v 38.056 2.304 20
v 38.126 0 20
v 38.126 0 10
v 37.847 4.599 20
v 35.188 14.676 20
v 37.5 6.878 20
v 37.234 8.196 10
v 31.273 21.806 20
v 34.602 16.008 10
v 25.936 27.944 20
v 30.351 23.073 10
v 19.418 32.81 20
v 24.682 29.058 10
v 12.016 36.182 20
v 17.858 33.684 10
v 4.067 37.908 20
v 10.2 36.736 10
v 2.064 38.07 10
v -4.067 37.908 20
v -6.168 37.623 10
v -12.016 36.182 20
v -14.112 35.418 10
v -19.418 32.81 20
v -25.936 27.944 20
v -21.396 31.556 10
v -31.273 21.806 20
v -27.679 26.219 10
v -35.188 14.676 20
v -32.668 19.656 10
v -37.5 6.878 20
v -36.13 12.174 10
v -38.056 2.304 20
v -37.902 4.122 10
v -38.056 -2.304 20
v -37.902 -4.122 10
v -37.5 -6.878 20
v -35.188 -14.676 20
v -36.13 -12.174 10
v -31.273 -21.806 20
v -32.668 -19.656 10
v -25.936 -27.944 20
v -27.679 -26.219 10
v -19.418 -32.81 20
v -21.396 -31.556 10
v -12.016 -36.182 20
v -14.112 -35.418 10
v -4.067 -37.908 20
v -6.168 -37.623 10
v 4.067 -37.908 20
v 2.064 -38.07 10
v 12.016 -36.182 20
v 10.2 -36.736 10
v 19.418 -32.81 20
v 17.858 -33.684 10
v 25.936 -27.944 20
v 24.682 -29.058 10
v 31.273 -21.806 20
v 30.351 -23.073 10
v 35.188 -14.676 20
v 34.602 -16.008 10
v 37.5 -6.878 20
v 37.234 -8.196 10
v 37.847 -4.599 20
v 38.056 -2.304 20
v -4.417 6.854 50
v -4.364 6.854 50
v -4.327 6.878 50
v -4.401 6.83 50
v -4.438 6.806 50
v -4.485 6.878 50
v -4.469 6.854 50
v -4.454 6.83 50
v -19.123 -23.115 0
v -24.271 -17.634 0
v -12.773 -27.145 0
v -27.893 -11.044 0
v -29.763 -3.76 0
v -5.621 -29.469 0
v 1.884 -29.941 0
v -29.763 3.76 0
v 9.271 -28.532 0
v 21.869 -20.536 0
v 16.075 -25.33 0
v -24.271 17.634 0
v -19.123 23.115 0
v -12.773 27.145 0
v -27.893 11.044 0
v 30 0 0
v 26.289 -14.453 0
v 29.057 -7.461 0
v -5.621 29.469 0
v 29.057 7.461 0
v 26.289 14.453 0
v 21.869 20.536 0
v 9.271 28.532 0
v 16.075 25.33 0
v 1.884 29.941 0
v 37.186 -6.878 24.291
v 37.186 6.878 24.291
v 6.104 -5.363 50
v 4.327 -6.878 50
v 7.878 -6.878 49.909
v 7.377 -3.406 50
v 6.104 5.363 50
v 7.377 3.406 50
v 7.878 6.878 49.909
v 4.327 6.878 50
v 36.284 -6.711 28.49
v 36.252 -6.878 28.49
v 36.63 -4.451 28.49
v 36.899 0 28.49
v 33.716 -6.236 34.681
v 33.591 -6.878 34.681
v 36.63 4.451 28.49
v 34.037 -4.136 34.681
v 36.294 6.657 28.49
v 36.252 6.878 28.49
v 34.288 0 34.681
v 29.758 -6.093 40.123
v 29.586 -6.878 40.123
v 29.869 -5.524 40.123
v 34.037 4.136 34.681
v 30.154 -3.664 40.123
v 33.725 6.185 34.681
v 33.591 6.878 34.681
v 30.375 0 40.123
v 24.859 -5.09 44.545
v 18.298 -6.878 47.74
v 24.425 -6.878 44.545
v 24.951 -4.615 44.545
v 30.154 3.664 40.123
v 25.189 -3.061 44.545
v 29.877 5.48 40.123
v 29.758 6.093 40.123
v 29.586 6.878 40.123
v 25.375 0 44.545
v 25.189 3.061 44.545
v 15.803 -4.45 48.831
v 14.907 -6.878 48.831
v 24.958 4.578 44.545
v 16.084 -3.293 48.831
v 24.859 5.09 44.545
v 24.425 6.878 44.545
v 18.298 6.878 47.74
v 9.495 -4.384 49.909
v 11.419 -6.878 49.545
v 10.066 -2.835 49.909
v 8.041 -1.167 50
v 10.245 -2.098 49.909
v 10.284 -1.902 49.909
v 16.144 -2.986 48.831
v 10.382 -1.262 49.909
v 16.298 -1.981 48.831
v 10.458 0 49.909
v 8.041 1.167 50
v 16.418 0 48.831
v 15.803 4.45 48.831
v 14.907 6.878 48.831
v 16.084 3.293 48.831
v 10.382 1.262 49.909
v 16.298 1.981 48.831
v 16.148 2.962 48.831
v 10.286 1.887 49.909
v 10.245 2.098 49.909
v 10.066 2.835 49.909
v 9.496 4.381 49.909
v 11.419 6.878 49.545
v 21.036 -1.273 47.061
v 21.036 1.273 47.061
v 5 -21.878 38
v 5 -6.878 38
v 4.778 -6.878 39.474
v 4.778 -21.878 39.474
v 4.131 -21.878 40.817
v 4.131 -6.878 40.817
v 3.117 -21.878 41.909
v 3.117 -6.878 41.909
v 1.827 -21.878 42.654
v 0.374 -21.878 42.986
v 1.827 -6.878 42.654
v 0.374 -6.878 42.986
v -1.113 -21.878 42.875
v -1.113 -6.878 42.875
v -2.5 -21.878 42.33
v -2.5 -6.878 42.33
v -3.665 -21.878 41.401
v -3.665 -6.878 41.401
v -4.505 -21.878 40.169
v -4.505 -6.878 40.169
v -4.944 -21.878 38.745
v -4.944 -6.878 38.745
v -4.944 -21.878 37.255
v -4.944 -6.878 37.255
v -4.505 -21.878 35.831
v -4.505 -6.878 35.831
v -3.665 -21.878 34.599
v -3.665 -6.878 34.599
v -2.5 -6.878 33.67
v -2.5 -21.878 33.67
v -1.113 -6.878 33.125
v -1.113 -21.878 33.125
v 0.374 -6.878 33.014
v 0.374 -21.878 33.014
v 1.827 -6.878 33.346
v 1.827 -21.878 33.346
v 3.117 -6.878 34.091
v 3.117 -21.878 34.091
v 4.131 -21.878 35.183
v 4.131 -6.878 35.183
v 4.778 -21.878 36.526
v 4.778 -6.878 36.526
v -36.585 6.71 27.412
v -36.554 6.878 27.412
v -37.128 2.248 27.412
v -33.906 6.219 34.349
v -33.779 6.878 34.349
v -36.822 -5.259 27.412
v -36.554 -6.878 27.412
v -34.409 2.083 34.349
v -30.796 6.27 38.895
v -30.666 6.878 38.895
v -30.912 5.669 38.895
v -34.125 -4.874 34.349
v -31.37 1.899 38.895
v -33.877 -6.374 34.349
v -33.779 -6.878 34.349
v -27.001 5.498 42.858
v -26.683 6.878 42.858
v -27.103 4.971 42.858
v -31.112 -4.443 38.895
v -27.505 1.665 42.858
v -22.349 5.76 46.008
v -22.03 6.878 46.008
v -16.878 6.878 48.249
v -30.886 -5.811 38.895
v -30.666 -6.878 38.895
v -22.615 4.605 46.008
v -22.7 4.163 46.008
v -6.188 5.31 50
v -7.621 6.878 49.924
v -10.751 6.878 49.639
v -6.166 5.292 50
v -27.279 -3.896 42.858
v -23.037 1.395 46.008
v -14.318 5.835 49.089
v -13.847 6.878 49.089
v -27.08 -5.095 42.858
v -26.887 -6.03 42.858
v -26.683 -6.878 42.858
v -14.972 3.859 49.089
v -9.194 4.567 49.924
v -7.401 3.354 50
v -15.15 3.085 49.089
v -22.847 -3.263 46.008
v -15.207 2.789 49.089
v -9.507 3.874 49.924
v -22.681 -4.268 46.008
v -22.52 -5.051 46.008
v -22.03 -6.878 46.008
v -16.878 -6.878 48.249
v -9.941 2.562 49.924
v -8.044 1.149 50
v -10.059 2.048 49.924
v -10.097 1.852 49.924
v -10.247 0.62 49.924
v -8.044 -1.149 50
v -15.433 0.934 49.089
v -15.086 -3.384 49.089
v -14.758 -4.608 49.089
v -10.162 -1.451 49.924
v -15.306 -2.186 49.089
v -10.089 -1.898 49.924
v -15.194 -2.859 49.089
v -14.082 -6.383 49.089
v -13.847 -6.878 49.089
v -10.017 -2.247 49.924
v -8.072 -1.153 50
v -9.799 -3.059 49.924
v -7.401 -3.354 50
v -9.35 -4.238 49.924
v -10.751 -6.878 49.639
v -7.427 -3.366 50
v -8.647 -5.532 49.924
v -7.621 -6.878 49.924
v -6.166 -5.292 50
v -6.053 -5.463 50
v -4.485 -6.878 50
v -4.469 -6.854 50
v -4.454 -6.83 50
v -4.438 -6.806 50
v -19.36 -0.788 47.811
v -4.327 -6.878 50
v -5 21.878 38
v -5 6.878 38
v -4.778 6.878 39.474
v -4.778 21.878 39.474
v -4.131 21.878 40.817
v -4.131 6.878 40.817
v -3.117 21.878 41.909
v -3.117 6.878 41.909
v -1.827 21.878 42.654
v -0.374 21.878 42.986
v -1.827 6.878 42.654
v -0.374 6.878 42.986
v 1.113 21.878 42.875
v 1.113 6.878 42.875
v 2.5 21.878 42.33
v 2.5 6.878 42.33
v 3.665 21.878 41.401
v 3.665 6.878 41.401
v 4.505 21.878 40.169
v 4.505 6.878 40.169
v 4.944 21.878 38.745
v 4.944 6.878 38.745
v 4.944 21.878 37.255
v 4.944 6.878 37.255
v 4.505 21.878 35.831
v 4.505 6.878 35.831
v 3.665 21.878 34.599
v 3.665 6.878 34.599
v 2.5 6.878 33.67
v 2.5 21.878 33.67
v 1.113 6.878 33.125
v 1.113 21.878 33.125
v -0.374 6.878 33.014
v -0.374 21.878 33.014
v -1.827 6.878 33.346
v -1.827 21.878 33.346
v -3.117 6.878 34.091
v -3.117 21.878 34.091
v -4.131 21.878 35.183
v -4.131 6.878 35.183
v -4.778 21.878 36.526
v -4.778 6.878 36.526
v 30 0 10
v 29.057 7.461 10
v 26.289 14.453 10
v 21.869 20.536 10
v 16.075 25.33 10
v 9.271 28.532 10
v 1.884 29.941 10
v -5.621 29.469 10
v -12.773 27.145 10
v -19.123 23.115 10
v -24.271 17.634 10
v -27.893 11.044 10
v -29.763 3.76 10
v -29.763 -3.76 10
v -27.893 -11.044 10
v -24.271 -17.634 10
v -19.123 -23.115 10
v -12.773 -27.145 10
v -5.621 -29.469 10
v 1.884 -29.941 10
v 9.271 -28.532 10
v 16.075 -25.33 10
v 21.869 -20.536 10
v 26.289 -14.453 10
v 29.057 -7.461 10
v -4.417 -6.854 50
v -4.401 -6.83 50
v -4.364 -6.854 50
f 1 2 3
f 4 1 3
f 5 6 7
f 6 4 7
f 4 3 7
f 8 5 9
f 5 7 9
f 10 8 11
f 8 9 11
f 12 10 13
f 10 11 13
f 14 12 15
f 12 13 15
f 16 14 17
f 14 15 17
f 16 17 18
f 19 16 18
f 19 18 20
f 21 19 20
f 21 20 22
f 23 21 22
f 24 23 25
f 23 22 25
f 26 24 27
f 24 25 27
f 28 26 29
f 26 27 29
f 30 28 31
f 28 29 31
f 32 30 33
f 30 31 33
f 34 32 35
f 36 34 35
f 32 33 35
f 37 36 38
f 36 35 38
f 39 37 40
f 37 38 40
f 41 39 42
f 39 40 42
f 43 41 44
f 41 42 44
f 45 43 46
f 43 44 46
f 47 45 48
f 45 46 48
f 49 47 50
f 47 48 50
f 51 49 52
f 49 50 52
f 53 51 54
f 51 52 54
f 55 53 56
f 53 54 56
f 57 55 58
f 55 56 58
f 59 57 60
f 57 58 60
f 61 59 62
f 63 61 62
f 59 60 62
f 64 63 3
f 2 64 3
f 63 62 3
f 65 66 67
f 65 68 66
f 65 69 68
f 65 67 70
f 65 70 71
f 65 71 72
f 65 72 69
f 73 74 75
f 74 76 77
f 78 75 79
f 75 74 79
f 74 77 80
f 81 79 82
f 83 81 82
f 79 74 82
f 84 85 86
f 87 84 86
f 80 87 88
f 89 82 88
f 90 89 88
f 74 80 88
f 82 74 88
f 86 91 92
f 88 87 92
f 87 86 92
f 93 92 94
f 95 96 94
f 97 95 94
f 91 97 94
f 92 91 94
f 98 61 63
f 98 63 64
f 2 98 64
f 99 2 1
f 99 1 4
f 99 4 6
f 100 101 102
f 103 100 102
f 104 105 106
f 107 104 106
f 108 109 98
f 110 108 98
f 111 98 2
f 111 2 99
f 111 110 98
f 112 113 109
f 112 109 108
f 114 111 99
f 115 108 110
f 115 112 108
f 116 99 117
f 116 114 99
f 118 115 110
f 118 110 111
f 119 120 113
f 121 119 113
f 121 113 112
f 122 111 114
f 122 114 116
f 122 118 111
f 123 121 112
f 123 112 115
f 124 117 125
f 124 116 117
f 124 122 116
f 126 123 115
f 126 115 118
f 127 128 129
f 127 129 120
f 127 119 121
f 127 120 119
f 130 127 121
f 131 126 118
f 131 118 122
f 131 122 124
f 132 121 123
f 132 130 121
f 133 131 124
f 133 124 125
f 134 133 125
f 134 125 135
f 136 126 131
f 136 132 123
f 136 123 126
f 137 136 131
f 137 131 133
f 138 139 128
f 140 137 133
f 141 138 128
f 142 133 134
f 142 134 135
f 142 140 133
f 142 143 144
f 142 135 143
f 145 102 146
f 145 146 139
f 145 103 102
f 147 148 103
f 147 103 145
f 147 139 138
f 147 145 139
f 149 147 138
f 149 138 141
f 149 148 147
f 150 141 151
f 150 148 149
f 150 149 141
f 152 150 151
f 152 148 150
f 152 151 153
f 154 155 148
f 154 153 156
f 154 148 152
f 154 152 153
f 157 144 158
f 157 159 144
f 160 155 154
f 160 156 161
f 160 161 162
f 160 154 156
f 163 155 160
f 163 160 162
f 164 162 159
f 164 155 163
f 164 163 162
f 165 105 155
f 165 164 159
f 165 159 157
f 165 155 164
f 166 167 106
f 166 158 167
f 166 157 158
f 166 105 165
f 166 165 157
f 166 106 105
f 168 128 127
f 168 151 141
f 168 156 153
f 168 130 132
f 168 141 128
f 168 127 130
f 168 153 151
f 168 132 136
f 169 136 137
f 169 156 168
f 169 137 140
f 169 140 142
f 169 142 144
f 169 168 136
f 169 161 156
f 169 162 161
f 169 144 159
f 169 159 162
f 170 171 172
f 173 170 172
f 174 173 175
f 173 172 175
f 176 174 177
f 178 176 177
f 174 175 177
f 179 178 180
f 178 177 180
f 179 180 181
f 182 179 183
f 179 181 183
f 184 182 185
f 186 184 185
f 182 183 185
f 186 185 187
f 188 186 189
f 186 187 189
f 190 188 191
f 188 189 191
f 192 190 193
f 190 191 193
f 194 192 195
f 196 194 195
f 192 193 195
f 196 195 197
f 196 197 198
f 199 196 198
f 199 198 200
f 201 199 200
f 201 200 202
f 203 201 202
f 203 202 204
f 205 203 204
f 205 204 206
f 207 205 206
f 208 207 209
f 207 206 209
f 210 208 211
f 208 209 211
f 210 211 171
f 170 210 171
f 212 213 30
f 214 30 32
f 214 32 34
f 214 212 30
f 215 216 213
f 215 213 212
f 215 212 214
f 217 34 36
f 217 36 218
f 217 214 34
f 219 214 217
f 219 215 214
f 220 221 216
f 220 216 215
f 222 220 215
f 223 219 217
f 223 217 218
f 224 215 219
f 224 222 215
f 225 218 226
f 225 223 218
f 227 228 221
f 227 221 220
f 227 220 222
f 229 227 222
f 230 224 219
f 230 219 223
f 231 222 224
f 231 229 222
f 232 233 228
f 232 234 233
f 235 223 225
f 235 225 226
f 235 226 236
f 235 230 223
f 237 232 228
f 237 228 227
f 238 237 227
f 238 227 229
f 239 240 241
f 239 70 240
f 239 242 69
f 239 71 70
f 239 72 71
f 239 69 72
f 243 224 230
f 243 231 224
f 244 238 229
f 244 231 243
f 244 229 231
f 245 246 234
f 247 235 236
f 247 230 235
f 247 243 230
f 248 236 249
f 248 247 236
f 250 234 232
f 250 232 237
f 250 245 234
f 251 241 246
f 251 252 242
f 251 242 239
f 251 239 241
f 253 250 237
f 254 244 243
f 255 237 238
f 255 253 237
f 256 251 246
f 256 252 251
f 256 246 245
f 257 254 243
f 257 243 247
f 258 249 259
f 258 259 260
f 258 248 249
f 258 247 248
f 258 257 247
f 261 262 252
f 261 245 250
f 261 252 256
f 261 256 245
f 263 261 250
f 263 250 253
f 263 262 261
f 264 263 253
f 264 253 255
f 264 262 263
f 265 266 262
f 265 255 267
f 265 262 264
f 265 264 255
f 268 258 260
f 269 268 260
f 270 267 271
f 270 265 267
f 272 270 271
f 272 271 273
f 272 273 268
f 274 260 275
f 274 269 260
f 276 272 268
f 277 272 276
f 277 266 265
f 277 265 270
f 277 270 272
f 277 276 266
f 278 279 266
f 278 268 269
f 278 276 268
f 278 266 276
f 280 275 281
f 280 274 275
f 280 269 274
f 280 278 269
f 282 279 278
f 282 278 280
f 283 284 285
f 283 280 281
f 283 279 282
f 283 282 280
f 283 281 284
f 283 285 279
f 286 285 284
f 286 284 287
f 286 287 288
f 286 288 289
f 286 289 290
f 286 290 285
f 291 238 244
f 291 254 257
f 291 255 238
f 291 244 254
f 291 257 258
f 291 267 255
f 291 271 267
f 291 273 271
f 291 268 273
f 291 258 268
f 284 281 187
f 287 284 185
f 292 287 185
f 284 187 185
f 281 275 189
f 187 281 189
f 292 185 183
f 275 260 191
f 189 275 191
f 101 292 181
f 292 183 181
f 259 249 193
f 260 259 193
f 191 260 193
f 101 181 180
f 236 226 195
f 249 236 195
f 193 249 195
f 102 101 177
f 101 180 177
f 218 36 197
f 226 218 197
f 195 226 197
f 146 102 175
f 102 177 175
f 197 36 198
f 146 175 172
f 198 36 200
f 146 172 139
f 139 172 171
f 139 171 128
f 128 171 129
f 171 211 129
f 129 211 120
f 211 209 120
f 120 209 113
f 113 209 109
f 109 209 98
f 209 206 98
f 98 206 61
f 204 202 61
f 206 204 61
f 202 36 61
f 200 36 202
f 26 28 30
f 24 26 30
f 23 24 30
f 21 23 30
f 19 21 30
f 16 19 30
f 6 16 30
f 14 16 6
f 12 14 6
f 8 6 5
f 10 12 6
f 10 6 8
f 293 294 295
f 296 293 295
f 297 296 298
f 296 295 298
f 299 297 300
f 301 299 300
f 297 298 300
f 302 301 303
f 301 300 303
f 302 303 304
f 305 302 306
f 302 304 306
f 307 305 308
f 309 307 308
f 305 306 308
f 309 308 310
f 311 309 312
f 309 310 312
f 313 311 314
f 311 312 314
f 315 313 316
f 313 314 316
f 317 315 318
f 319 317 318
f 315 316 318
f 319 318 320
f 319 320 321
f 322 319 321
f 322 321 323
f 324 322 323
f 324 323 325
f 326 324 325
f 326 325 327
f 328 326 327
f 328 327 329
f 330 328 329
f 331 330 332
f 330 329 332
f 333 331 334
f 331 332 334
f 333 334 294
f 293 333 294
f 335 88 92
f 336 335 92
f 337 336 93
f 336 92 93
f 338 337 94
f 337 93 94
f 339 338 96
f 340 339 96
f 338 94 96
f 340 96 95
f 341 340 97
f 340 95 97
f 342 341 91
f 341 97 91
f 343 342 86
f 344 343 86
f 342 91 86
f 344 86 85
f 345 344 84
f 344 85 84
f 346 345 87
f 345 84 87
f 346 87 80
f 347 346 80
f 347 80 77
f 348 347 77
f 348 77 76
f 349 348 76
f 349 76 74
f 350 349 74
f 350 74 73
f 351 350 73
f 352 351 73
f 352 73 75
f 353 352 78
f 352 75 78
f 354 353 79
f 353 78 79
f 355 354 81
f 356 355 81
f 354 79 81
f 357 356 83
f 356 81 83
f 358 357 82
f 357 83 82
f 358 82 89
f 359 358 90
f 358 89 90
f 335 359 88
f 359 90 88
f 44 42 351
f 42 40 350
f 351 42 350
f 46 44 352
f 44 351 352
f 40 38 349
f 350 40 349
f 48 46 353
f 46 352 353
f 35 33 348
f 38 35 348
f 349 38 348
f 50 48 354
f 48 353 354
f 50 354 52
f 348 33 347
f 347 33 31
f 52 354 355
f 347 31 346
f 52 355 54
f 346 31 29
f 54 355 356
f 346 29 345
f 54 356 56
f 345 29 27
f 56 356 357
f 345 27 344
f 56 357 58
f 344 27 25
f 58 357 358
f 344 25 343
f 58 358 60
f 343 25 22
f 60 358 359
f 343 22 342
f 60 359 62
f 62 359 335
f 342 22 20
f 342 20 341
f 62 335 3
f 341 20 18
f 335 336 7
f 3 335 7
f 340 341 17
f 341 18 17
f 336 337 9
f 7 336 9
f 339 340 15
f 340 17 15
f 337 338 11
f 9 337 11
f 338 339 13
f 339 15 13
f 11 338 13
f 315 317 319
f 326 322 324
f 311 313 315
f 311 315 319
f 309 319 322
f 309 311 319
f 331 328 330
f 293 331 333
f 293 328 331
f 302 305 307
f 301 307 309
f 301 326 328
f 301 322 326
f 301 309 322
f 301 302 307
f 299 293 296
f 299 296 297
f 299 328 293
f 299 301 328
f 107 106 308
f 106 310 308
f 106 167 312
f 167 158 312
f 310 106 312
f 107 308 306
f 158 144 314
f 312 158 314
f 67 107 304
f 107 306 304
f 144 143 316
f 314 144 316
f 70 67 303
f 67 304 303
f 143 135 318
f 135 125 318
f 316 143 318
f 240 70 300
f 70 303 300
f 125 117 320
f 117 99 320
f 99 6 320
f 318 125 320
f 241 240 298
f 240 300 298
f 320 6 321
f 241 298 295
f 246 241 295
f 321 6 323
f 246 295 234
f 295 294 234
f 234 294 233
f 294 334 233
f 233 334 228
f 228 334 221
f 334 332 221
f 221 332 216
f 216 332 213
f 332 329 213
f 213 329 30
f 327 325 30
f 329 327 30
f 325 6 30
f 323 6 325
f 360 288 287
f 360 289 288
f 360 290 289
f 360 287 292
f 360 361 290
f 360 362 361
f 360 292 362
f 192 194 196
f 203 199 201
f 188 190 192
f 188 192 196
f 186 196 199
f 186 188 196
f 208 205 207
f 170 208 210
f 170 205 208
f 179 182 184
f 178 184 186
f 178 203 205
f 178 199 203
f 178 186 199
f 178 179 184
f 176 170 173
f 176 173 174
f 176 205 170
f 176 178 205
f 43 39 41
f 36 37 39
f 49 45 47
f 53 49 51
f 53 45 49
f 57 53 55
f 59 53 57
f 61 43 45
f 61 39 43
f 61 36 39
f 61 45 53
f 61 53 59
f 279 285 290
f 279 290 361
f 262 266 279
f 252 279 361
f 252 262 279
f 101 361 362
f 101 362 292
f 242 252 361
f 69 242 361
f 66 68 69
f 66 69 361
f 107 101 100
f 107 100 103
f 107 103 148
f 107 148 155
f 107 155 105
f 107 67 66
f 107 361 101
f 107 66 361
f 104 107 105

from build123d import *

# Parameters (mm, degrees)
F0_R        = 30
F1_DEPTH    = 10
F2_R        = 38.1255
F2_R_2      = 30
F3_DEPTH    = 10
F5_DEPTH    = 10
F7_DEPTH    = 20
F8_T2_ANGLE = 246.2138015041
F8_T4_ANGLE = 246.2138015041
F10_R       = 5
F11_DEPTH   = 15
F9_R        = 5
F12_DEPTH   = 15


# Not quite as in the source:
# - a fillet or chamfer that OpenCascade refuses, or shapes differently, is made with other operations: its cross-section is extruded or revolved along the edge and cut away or added


with BuildPart() as f1:
    # F0 (on Top) → F1 (new body)
    with BuildSketch(Plane.XY):
        Circle(F0_R)
    extrude(amount=F1_DEPTH)

    # F2 (on face) → F3 (join)
    with BuildSketch(Plane.XY.offset(10)):
        Circle(F2_R)
        Circle(F2_R_2, mode=Mode.SUBTRACT)
        Circle(F2_R_2)
    extrude(amount=F3_DEPTH)

    # F4 (on face) → F5 (join)
    with BuildSketch(Plane.XY.offset(20)):
        with BuildLine():
            Line((37.5, 6.8777721865), (-37.5, 6.8777721865))
            ThreePointArc((-37.5, 6.8777721865), (-38.1255, 0), (-37.5, -6.8777721865))
            Line((-37.5, -6.8777721865), (37.5, -6.8777721865))
            ThreePointArc((37.5, -6.8777721865), (37.9688029851, -3.4530783549), (38.1255, 0))
            ThreePointArc((38.1255, 0), (37.9688029851, 3.4530783549), (37.5, 6.8777721865))
        make_face()
    extrude(amount=F5_DEPTH)

    # F6 (on face) → F7 (join)
    with BuildSketch(Plane.XY.offset(30)):
        with BuildLine():
            Line((37.5, 6.8777721865), (-37.5, 6.8777721865))
            ThreePointArc((-37.5, 6.8777721865), (-38.1255, 0), (-37.5, -6.8777721865))
            Line((-37.5, -6.8777721865), (37.5, -6.8777721865))
            ThreePointArc((37.5, -6.8777721865), (38.1255, 0), (37.5, 6.8777721865))
        make_face()
    extrude(amount=F7_DEPTH)

    # F8: fillet of radius 30 on 2 edges, made by hand

    # F8_s1 → F8_t2 (revolve, cut)
    with BuildSketch(Plane(origin=(0, 0, 0), x_dir=(0, 0, 1), z_dir=(-0.8376529376, 0.5462028526, 0))):
        with BuildLine():
            ThreePointArc((20, -38.1255), (41.2132034356, -29.3387034356), (50, -8.1255))
            Line((50, -8.1255), (50, -38.1255))
            Line((50, -38.1255), (20, -38.1255))
        make_face()
    revolve(axis=Axis((0, 0, 50), (0, 0, 1)), revolution_arc=F8_T2_ANGLE, mode=Mode.SUBTRACT)

    # F8_s3 → F8_t4 (revolve, cut)
    with BuildSketch(Plane(origin=(0, 0, 0), x_dir=(0, 0, 1), z_dir=(0.8376529376, -0.5462028526, 0))):
        with BuildLine():
            ThreePointArc((20, -38.1255), (41.2132034356, -29.3387034356), (50, -8.1255))
            Line((50, -8.1255), (50, -38.1255))
            Line((50, -38.1255), (20, -38.1255))
        make_face()
    revolve(axis=Axis((0, 0, 50), (0, 0, 1)), revolution_arc=F8_T4_ANGLE, mode=Mode.SUBTRACT)

    # F10 (on face) → F11 (join)
    with BuildSketch(Plane(origin=(0, 6.8777721865, 0), x_dir=(-1, 0, 0), z_dir=(0, 1, 0))):
        with Locations((0, 38)):
            Circle(F10_R)
    extrude(amount=F11_DEPTH)

    # F9 (on face) → F12 (join)
    with BuildSketch(Plane.XZ.offset(6.8777721865)):
        with Locations((0, 38)):
            Circle(F9_R)
    extrude(amount=F12_DEPTH)


solid = f1.part
